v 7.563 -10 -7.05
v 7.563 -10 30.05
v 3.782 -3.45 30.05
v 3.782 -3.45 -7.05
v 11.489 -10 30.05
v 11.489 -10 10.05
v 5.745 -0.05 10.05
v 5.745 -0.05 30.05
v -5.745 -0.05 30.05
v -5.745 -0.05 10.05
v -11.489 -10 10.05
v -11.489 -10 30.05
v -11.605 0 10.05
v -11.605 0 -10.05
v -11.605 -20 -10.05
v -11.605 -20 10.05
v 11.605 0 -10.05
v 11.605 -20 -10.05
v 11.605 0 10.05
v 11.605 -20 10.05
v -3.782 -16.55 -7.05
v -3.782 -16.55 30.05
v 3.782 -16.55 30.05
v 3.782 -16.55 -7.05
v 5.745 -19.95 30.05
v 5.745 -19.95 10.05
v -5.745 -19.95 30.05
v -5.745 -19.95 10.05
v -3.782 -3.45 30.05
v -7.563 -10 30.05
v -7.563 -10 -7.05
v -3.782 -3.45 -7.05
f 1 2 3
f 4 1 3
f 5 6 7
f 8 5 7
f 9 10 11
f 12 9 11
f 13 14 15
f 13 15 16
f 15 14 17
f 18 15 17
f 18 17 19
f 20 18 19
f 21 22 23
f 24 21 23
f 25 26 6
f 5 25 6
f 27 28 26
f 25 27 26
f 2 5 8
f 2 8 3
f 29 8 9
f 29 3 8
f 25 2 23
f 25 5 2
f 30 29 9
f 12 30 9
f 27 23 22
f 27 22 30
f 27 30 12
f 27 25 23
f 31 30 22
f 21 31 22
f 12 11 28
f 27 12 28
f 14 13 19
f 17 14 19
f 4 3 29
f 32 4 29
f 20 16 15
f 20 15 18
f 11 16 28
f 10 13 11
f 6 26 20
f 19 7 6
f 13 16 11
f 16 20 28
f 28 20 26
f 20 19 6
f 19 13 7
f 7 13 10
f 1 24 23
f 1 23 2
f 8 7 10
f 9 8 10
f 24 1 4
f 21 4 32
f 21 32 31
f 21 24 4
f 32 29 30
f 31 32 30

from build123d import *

# Parameters (mm, degrees)
SKETCH_W     = 23.20948
SKETCH_H     = 20.1
PAD_DEPTH    = 20
PAD001_DEPTH = 20
POCKET_DEPTH = 37.1


with BuildPart() as part:
    # Sketch → Pad (new body)
    with BuildSketch(Plane.XZ):
        Rectangle(SKETCH_W, SKETCH_H)
    extrude(amount=PAD_DEPTH)

    # Sketch001 (on DatumPlane) → Pad001 (join)
    with BuildSketch(Plane(origin=(0, 0, 10.05), x_dir=(-1, 0, 0), z_dir=(0, 0, 1))):
        Polygon((-5.744635, 19.95), (-11.48927, 10), (-5.744635, 0.05), (5.744635, 0.05), (11.48927, 10), (5.744635, 19.95), align=None)
    extrude(amount=PAD001_DEPTH)

    # Sketch002 (on Face13 of Pad001) → Pocket (cut)
    with BuildSketch(Plane(origin=(0, 0, 30.05), x_dir=(-1, 0, 0), z_dir=(0, 0, 1))):
        Polygon((3.781644, 16.55), (-3.781644, 16.55), (-7.563289, 10), (-3.781644, 3.45), (3.781644, 3.45), (7.563289, 10), align=None)
    extrude(amount=-POCKET_DEPTH, mode=Mode.SUBTRACT)


solid = part.part
